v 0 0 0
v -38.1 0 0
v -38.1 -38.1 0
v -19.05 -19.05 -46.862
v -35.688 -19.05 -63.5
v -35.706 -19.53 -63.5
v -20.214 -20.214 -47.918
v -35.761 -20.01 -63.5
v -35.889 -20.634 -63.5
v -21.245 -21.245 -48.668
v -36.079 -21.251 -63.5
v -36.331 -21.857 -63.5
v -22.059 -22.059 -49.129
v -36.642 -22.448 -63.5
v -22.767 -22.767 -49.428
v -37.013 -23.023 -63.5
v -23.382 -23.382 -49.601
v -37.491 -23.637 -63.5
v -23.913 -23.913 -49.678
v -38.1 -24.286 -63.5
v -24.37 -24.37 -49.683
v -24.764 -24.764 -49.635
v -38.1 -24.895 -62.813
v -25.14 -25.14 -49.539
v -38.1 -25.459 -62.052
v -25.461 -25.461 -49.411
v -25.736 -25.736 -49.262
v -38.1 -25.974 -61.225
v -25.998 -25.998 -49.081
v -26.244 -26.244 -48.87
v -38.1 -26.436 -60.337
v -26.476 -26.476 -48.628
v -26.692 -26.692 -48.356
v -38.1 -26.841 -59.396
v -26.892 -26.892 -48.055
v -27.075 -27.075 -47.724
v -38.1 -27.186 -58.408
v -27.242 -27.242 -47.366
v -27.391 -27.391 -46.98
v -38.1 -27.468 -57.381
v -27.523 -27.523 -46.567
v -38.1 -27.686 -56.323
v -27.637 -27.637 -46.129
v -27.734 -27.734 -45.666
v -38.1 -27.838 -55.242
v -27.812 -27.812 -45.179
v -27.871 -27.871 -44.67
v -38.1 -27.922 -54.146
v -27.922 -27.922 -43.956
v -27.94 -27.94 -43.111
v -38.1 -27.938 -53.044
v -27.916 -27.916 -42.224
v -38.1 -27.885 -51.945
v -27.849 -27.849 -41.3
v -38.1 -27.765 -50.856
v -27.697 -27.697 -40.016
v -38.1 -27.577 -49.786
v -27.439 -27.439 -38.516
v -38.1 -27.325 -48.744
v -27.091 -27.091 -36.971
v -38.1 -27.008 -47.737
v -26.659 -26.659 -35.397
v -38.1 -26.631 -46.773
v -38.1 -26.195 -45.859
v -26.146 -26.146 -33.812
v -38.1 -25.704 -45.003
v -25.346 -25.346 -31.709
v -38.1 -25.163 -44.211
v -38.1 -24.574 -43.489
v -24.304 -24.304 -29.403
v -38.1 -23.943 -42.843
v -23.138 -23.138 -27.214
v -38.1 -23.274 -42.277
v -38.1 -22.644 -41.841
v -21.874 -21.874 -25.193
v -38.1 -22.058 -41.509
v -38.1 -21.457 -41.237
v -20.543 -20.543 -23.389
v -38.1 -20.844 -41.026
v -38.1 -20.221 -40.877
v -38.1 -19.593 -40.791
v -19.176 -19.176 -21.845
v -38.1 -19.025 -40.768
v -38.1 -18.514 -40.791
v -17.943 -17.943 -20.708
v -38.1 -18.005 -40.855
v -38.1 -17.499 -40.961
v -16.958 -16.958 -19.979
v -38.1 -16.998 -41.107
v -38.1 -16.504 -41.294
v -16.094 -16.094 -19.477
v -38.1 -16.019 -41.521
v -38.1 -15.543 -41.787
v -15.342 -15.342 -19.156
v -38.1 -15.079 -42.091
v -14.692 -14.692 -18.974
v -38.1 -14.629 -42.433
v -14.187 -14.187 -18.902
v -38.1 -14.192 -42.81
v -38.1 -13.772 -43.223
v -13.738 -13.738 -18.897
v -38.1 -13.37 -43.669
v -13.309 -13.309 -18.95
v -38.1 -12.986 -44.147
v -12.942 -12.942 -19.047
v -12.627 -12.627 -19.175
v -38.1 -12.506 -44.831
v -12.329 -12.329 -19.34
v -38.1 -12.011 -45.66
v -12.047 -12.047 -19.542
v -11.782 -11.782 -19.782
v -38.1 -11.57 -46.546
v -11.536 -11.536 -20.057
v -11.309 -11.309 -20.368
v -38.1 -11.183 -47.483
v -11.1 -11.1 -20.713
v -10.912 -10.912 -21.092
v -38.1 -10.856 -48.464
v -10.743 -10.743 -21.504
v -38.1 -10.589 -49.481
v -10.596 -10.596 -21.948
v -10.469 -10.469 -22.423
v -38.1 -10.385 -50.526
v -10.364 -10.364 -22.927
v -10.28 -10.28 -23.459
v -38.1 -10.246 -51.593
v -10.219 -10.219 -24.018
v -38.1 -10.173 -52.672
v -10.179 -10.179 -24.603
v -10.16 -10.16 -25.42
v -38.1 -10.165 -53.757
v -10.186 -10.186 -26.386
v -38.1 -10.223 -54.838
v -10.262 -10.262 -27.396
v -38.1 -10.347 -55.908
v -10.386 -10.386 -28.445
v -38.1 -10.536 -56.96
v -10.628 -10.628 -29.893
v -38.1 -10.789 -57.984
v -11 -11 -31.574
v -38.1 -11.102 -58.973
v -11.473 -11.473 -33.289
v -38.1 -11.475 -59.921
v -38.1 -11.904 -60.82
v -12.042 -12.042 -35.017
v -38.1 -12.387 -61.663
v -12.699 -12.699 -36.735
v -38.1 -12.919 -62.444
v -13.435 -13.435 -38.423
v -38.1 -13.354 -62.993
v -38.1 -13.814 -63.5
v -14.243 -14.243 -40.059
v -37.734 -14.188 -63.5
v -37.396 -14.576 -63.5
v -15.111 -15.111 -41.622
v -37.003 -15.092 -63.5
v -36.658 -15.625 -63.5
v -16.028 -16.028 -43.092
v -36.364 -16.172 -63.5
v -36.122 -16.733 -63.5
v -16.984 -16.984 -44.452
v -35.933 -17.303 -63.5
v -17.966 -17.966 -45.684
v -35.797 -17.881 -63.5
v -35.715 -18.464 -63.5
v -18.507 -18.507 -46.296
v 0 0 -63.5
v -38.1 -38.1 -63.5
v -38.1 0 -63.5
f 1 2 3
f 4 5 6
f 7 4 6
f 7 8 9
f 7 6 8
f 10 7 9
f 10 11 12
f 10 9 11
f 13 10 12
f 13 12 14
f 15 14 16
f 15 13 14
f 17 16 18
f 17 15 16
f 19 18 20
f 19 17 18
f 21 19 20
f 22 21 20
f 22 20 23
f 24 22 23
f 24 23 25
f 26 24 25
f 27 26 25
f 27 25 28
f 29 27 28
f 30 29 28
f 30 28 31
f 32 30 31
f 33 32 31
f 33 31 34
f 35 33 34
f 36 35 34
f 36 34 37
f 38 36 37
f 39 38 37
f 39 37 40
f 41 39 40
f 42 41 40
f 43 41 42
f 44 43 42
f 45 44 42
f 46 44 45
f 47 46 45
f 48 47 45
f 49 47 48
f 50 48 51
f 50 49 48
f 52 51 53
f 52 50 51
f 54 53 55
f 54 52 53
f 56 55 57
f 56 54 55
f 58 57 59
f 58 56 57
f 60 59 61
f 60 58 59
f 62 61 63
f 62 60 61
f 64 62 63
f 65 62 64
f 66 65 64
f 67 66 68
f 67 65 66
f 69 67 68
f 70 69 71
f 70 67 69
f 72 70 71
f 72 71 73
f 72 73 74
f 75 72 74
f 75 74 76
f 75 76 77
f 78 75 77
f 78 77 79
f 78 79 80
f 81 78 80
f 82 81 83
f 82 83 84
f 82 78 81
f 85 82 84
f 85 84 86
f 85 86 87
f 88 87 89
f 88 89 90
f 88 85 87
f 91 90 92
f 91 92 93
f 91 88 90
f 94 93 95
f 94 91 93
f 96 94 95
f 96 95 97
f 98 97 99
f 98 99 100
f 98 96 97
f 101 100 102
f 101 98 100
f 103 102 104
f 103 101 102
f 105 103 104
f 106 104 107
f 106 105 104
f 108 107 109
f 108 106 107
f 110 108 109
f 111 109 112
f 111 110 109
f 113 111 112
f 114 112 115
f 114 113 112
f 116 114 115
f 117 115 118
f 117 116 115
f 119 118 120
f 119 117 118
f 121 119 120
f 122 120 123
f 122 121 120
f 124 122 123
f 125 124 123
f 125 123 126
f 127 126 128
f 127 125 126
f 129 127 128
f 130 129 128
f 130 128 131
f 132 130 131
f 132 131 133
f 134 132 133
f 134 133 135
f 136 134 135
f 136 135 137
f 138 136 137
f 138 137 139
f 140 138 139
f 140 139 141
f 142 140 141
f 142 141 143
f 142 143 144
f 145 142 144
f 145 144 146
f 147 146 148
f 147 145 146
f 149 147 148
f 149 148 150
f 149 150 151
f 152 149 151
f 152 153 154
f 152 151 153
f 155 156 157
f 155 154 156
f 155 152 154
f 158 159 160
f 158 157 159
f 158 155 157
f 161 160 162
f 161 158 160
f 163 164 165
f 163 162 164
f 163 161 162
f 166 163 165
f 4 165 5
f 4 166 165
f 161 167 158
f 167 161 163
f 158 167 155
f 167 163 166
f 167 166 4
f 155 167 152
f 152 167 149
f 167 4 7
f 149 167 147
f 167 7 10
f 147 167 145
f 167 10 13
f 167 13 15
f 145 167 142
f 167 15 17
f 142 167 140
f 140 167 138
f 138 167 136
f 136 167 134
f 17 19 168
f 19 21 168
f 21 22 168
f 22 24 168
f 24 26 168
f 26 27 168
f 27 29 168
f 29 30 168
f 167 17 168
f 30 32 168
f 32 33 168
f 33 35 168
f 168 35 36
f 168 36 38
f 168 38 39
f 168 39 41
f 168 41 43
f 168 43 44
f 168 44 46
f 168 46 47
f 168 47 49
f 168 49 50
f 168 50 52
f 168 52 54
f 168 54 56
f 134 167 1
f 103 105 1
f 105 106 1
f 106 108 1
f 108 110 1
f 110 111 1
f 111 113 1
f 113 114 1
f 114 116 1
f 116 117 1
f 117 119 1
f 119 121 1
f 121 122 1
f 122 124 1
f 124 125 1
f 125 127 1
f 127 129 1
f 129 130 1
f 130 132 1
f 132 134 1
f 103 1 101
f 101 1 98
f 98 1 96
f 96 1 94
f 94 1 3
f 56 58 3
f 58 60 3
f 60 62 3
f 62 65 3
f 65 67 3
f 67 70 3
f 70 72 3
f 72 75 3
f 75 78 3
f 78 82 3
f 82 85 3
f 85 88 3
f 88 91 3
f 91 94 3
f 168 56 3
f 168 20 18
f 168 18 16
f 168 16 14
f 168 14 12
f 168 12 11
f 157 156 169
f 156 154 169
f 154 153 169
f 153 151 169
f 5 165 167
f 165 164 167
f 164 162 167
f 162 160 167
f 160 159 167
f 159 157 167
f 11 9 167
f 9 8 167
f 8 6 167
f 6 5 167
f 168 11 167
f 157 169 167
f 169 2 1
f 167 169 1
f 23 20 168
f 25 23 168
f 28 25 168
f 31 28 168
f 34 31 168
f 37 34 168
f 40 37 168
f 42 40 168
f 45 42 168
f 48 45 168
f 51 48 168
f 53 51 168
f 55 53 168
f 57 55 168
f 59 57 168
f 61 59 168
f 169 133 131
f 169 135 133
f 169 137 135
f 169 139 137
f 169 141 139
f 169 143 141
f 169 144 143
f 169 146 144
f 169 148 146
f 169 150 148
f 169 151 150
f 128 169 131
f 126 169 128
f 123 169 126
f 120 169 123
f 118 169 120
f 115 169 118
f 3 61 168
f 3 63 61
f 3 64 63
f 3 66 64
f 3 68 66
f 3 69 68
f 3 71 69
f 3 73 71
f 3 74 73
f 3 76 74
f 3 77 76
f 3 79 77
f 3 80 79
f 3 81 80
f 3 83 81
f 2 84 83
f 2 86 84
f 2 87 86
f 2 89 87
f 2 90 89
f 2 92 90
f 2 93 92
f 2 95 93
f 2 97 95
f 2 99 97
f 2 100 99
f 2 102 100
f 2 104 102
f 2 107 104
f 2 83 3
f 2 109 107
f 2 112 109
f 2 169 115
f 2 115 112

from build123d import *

# Parameters (mm, degrees)
F0_W          = 38.1
F0_H          = 63.5
F1_DEPTH      = 38.1
F4_R          = 8.89
F5_DEPTH      = 50.8
F5_DEPTH_BACK = 76.2
F7_DEPTH      = 76.2


with BuildPart() as f1:
    # F0 (on Front) → F1 (new body)
    with BuildSketch(Plane.XZ):
        with Locations((-19.05, -31.75)):
            Rectangle(F0_W, F0_H)
    extrude(amount=F1_DEPTH)

    # F4 (on line) → F5 (cut, two sides)
    with BuildSketch(Plane(origin=(-7.62, 0, -7.62), x_dir=(0.7071067812, 0, -0.7071067812), z_dir=(-0.7071067812, 0, -0.7071067812))) as f5_sk:
        with Locations((10.7763073453, 19.05)):
            Circle(F4_R)
    extrude(amount=-F5_DEPTH, mode=Mode.SUBTRACT)
    extrude(f5_sk.sketch, amount=F5_DEPTH_BACK, mode=Mode.SUBTRACT)

    # F6 (on face) → F7 (cut)
    with BuildSketch(Plane.XY):
        Polygon((0, -38.1), (0, 0), (-38.1, -38.1), align=None)
    extrude(amount=-F7_DEPTH, mode=Mode.SUBTRACT)


solid = f1.part
